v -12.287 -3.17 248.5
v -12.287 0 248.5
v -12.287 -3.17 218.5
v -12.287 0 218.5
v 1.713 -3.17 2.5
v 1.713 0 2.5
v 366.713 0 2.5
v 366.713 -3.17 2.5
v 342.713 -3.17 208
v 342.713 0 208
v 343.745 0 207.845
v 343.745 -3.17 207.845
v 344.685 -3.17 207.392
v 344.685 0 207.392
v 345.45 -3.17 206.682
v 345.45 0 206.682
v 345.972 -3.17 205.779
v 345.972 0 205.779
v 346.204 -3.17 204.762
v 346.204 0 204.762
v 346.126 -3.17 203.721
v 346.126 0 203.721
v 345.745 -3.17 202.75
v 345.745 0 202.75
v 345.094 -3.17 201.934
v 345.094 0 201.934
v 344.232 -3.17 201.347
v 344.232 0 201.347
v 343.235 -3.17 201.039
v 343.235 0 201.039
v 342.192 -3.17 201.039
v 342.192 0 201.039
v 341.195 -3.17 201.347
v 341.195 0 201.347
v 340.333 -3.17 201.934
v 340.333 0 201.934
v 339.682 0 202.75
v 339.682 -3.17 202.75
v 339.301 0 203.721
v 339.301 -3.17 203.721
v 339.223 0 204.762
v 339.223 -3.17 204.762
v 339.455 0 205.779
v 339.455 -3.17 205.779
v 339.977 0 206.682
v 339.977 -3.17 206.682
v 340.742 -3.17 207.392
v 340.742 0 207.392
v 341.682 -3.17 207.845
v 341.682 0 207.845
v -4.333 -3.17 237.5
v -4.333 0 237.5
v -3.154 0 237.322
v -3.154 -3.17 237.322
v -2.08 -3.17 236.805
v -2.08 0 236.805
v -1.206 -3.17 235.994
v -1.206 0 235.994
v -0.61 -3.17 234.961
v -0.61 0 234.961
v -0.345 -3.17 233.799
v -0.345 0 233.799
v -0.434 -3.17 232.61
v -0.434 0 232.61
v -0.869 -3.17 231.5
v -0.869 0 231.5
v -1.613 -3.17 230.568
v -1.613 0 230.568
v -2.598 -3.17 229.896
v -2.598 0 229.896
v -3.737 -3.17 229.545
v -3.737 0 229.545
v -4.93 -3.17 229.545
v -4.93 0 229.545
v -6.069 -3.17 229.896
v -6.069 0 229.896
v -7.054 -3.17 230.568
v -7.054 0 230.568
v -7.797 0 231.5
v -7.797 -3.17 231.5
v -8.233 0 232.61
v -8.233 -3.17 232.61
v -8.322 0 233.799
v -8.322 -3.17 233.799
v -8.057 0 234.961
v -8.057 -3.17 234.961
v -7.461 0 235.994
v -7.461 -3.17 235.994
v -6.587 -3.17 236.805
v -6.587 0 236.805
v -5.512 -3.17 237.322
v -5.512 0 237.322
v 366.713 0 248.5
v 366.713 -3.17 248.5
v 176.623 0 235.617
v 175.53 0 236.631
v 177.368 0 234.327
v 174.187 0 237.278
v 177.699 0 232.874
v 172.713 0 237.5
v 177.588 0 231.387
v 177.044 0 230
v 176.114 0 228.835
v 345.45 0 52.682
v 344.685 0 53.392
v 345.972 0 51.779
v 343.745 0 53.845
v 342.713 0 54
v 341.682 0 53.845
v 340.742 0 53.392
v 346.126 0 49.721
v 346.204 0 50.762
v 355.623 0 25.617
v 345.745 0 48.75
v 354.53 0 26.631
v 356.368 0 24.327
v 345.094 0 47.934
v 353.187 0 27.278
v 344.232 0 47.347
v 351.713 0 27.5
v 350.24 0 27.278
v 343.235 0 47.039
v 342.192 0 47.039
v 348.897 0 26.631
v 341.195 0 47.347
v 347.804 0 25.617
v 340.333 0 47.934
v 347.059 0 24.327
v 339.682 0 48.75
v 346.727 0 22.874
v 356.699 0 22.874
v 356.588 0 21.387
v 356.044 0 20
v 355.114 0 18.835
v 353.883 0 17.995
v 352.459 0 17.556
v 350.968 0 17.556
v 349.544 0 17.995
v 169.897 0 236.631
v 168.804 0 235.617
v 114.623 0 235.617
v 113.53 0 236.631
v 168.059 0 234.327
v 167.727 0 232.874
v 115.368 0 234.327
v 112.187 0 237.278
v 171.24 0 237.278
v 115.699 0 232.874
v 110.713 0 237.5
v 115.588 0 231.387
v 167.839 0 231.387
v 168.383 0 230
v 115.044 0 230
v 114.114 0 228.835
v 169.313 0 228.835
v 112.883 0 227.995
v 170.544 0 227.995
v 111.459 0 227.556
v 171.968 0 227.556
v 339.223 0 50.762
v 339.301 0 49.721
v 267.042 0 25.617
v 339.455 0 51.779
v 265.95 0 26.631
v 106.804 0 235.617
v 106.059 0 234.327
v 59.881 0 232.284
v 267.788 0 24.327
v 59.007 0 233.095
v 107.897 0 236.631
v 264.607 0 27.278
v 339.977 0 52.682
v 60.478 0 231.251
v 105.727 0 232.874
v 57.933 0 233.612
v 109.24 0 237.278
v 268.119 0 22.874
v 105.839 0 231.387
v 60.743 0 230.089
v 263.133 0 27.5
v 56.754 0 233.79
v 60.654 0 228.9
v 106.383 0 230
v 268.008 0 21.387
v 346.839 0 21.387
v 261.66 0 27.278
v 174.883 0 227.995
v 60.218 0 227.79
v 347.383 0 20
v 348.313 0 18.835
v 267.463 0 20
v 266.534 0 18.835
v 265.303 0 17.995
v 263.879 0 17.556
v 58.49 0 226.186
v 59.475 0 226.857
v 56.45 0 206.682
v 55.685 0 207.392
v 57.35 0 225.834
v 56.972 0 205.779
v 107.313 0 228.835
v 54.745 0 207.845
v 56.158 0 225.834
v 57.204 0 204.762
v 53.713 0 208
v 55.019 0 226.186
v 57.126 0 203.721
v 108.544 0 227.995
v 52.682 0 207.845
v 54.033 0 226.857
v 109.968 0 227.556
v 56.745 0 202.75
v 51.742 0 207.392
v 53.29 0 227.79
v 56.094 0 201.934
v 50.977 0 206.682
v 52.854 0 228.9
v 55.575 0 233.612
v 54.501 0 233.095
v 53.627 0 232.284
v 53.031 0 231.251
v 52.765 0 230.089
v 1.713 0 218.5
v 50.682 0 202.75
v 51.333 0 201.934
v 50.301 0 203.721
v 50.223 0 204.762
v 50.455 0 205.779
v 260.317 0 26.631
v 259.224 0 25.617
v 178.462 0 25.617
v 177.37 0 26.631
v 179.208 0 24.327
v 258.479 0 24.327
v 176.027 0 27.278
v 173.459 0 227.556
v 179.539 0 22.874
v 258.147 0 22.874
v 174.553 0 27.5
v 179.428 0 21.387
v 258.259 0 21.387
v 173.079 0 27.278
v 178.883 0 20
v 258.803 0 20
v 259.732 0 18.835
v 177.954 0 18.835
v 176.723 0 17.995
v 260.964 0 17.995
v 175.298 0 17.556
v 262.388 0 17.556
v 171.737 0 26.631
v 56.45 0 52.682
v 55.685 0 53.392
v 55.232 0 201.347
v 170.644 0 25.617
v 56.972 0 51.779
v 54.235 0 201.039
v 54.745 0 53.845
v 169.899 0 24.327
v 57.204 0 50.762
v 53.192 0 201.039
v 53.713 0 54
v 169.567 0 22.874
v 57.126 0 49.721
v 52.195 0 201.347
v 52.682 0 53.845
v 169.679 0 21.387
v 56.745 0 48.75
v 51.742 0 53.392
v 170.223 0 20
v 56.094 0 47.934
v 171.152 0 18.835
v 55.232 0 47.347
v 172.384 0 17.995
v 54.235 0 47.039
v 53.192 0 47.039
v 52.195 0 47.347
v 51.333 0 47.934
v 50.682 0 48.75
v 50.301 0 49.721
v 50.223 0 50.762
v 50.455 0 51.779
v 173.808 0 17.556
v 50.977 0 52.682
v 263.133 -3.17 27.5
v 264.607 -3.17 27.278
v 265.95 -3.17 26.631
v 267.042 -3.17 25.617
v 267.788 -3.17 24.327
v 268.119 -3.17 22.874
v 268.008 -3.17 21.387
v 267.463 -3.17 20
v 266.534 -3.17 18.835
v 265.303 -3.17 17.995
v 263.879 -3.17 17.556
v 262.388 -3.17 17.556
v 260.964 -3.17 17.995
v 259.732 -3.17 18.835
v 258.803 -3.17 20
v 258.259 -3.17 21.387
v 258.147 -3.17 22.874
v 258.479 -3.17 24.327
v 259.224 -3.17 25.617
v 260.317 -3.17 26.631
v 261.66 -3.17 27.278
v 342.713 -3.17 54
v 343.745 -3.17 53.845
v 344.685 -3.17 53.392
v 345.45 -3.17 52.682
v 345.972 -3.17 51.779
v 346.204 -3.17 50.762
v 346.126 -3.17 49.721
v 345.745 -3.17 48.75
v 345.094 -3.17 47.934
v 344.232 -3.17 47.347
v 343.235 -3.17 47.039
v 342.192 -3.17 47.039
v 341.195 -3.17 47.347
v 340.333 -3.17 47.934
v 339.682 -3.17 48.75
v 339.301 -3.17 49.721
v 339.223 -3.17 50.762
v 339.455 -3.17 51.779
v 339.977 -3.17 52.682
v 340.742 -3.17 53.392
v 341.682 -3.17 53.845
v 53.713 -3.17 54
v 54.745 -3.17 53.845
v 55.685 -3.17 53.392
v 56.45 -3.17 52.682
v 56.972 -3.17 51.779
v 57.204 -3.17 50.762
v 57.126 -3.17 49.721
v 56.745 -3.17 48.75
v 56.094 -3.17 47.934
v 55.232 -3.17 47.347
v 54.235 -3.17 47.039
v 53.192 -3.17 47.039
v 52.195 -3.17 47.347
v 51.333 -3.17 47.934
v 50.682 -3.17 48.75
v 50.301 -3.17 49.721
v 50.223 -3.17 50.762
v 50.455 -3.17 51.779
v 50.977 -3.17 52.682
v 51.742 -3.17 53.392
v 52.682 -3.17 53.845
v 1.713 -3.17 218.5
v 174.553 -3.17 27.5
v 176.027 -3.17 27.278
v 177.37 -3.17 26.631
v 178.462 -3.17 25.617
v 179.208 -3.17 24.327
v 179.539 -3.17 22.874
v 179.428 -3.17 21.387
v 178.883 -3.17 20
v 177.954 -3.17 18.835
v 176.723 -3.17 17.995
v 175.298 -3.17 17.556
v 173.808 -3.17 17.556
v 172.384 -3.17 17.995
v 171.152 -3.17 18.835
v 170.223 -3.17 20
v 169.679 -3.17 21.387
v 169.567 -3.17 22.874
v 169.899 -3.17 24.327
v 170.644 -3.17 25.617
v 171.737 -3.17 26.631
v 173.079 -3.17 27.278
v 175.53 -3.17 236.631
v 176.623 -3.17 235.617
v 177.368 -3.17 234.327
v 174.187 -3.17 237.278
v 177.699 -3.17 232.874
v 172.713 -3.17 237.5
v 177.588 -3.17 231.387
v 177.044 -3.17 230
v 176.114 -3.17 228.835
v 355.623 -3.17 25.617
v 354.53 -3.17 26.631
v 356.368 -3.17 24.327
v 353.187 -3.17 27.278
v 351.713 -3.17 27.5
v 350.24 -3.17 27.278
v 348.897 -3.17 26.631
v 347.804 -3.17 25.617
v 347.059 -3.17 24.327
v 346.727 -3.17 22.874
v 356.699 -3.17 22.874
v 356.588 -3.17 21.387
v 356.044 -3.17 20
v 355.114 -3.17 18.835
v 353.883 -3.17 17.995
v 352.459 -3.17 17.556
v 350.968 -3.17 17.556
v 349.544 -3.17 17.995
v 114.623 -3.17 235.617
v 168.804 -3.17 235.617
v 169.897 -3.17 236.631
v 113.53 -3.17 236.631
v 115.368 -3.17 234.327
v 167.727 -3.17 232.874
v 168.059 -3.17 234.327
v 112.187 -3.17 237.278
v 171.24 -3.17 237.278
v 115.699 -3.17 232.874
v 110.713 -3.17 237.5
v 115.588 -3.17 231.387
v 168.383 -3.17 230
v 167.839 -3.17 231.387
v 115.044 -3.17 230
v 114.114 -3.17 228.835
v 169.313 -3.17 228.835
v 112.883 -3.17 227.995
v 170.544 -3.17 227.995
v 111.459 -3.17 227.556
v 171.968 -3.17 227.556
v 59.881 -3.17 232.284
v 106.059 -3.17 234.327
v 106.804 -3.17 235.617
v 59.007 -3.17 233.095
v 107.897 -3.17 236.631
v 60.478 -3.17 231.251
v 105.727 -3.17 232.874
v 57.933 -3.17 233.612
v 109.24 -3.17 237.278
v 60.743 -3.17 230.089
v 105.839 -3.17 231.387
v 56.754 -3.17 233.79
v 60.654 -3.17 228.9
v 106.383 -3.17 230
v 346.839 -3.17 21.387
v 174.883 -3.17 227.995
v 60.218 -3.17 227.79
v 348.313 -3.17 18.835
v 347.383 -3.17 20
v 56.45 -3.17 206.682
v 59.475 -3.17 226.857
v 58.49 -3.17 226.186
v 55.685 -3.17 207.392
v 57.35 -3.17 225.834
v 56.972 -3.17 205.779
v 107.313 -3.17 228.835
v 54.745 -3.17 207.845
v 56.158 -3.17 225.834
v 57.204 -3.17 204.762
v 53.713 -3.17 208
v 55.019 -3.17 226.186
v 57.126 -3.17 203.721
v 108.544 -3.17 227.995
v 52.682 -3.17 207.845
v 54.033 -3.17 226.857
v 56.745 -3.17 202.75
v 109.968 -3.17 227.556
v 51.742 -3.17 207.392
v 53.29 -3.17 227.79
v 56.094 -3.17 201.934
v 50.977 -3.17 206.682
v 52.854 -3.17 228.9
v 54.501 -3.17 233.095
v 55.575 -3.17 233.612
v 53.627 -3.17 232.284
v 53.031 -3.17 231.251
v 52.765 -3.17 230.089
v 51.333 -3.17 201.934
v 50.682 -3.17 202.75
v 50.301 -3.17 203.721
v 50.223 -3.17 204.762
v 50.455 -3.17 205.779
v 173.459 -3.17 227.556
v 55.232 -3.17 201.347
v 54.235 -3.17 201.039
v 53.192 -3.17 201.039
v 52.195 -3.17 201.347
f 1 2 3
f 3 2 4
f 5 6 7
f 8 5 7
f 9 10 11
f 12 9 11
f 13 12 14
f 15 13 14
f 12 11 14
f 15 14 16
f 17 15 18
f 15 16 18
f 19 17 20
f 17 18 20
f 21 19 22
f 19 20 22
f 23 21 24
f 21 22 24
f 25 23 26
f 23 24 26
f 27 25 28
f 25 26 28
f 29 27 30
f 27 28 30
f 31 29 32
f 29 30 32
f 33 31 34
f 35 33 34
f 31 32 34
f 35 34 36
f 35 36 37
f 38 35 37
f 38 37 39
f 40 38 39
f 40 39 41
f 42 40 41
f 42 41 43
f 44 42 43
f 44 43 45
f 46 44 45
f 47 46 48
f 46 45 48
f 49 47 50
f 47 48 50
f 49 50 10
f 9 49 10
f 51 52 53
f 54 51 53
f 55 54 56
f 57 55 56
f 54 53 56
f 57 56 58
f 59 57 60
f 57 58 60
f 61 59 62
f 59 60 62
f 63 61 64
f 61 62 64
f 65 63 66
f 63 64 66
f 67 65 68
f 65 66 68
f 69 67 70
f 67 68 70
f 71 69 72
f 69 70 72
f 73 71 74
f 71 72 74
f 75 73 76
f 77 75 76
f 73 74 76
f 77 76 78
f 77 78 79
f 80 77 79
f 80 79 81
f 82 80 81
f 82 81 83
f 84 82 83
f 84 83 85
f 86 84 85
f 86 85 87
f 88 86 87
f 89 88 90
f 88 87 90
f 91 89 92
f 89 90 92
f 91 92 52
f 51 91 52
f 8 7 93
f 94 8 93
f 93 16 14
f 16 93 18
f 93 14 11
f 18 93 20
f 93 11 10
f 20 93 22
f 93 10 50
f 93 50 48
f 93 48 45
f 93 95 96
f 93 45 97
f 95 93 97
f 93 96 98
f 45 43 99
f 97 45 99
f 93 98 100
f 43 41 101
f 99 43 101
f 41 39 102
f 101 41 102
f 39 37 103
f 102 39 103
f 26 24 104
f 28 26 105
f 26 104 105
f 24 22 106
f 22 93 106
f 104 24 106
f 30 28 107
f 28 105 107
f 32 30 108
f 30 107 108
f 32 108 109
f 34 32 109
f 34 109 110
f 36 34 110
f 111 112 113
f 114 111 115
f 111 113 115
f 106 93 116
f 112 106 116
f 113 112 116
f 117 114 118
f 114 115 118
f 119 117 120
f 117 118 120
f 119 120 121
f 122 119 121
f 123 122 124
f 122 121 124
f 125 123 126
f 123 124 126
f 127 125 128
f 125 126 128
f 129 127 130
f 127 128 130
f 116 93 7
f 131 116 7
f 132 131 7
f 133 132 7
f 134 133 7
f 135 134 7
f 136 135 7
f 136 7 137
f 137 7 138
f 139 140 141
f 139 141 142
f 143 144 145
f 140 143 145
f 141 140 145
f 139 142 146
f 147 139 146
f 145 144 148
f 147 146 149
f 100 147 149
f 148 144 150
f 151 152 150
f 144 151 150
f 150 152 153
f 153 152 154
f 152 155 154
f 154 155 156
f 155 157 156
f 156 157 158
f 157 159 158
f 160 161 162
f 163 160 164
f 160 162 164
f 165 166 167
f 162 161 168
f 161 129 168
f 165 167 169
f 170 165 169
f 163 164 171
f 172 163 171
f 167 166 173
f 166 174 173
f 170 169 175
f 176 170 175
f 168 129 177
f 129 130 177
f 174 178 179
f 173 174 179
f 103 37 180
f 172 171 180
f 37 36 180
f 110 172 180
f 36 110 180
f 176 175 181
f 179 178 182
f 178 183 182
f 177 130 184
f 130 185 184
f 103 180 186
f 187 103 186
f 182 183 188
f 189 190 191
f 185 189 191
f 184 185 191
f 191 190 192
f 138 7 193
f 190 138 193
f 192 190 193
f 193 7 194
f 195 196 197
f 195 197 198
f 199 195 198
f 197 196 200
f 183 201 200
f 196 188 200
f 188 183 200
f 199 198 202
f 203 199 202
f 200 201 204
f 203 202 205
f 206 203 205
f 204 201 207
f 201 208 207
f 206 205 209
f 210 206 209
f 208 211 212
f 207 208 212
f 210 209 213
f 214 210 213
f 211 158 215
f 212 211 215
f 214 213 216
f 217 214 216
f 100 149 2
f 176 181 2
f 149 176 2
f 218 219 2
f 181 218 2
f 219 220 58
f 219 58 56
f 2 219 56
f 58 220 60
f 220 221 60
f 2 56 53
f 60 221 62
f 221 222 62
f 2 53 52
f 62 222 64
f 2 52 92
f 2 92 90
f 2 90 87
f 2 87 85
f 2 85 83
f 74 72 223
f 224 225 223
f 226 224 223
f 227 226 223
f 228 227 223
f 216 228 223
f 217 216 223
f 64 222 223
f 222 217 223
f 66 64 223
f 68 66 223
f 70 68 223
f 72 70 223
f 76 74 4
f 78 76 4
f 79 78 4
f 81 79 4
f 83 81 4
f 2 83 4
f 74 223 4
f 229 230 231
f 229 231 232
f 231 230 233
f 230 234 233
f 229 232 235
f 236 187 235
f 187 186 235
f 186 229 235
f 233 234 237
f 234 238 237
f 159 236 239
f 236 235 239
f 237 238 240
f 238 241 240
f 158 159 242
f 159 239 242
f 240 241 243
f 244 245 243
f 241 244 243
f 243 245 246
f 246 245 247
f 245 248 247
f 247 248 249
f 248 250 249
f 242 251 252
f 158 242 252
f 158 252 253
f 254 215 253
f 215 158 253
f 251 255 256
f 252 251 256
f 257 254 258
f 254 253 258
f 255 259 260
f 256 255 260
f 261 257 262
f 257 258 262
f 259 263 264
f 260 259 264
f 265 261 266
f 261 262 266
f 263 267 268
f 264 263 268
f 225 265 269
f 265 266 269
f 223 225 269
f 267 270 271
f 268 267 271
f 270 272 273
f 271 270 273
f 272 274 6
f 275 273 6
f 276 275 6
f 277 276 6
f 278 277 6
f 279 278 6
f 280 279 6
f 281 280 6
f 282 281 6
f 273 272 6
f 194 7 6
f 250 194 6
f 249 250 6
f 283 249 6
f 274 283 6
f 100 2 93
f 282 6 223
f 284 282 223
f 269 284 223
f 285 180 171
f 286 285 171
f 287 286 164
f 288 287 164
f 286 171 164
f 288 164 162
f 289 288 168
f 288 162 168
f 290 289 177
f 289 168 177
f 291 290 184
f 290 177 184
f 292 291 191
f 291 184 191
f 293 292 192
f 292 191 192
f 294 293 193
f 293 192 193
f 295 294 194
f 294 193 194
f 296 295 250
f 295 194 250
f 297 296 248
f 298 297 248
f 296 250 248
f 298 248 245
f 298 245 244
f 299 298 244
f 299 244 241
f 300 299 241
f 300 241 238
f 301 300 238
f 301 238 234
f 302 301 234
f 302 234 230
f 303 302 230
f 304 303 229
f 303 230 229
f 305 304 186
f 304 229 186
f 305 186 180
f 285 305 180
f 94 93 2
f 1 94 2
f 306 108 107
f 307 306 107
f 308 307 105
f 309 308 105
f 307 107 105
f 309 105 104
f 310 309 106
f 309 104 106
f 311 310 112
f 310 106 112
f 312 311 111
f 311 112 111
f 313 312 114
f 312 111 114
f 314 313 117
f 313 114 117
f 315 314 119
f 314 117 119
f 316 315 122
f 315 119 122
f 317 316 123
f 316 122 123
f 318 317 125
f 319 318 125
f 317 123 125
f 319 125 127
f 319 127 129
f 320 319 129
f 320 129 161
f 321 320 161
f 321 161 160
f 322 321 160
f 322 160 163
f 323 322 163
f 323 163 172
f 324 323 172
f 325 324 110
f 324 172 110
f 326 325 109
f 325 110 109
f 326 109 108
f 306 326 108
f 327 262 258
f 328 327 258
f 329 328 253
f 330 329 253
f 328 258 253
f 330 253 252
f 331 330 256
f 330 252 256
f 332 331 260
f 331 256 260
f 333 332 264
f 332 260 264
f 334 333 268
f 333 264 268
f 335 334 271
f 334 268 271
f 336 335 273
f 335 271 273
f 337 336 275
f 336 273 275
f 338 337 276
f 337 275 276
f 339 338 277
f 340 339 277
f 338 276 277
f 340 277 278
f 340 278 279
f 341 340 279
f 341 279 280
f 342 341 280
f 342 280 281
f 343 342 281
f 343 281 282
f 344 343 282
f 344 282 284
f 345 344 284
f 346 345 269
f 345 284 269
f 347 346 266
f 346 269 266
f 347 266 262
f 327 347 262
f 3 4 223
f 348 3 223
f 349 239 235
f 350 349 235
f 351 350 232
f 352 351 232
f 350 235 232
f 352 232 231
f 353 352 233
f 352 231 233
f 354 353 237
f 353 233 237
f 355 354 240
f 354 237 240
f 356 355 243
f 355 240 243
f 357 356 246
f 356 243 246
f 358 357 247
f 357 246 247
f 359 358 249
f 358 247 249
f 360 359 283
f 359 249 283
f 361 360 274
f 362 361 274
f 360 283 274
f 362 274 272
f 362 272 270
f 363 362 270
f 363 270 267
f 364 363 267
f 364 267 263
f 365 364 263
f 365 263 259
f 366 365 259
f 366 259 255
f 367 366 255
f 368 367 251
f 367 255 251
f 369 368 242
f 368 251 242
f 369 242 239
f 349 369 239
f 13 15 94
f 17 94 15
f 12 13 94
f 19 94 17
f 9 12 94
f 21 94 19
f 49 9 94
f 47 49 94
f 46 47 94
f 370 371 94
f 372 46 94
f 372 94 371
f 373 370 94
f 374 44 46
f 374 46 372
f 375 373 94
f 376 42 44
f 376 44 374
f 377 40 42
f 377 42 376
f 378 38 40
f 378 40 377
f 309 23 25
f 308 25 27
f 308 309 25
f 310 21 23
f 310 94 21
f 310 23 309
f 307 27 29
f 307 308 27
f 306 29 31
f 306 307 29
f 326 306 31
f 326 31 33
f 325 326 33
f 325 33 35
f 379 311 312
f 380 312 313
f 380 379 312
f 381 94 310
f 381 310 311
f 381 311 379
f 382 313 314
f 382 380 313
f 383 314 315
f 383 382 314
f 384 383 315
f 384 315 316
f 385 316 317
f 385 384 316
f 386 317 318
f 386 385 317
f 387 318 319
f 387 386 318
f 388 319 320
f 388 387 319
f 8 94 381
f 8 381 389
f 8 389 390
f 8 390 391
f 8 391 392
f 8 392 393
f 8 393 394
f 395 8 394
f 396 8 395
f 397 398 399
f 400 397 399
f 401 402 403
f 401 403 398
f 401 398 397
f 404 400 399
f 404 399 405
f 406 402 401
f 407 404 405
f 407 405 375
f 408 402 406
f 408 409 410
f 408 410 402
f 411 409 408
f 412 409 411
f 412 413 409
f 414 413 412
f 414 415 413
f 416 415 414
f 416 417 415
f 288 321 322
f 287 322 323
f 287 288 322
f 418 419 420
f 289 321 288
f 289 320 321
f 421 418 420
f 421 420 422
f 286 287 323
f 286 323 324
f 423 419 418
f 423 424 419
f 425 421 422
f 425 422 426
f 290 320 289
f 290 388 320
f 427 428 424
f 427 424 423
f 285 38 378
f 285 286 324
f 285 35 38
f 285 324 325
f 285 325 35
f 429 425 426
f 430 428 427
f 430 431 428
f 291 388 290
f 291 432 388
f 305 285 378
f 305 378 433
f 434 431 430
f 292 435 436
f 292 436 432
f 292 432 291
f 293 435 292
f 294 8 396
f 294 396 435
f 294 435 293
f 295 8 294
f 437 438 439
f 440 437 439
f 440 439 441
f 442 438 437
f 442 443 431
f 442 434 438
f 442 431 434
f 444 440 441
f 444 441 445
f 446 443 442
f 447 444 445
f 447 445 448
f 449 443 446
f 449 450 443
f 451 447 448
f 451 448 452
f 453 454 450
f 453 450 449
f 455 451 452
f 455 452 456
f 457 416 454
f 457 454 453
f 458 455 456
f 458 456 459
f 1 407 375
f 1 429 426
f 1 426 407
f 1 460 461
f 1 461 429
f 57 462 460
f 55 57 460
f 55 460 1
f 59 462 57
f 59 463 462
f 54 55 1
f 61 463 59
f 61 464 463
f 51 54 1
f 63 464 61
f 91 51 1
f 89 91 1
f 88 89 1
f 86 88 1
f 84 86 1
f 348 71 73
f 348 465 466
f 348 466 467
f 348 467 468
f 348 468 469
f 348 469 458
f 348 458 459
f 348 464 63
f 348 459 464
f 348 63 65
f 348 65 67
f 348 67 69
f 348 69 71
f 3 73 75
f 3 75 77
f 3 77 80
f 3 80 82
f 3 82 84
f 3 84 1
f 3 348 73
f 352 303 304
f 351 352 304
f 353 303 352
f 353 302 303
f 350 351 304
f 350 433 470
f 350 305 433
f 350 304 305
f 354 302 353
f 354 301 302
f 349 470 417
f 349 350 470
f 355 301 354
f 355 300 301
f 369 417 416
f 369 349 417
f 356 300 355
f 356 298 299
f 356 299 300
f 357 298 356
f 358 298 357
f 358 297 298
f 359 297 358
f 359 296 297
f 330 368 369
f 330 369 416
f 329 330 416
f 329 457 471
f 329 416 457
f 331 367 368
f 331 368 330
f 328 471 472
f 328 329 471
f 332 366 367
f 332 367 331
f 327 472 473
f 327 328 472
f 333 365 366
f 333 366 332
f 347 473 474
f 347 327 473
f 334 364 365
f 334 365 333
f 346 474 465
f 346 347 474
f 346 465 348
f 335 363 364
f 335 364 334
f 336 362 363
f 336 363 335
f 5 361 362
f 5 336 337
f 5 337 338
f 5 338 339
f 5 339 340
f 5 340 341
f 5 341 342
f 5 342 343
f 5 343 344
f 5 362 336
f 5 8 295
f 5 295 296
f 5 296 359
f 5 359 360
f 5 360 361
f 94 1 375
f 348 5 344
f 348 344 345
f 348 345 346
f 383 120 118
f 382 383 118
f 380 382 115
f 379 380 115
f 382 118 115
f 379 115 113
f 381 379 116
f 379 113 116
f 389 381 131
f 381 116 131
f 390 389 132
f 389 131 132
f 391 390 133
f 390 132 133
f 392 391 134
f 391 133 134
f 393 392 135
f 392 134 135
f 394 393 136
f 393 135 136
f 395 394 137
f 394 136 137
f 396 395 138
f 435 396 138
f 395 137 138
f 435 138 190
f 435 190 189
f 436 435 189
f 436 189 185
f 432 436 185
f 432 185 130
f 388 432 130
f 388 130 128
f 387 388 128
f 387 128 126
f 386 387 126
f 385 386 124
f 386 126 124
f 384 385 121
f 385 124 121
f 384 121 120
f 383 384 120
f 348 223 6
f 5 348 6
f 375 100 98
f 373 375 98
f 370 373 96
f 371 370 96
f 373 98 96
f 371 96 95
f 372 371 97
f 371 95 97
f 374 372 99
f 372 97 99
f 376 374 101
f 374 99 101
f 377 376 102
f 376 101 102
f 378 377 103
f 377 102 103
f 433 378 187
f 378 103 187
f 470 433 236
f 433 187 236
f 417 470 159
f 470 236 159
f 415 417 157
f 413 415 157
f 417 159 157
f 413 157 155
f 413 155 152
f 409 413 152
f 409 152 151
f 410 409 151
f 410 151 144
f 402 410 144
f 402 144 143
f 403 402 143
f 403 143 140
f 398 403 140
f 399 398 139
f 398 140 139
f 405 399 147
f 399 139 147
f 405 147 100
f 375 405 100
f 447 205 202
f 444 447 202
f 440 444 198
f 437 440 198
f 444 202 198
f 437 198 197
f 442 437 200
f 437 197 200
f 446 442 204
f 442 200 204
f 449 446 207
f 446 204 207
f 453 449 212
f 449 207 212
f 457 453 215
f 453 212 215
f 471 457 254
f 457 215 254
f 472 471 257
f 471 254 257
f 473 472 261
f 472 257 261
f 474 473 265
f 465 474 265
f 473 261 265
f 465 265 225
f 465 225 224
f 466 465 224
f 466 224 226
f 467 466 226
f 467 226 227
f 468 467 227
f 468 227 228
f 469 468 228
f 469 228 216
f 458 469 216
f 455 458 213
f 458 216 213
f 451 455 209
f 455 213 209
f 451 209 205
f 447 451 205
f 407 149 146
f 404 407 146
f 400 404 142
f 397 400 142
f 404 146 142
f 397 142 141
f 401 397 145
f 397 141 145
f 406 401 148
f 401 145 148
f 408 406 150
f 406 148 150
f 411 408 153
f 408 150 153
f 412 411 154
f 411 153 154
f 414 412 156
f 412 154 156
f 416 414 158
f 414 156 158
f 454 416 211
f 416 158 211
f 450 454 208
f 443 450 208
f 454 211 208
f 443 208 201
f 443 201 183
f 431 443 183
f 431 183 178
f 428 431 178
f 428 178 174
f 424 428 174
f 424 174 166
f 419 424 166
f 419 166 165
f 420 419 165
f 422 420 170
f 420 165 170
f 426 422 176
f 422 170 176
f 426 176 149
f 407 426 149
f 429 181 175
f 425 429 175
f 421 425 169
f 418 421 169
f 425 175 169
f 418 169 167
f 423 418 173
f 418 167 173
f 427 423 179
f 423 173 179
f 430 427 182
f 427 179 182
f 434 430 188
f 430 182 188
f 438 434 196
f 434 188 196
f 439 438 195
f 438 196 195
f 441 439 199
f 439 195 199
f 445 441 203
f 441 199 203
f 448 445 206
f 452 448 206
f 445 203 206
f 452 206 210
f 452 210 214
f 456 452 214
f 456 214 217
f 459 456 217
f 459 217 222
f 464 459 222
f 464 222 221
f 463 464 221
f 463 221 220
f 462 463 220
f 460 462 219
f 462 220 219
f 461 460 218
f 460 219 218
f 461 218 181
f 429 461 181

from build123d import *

# Parameters (mm, degrees)
SKETCH1_R           = 4
SKETCH1_R_2         = 3.5
SKETCH1_R_3         = 5
BOSS_EXTRUDE1_DEPTH = 3.17


with BuildPart() as part:
    # Sketch1 → Boss-Extrude1 (new body)
    with BuildSketch(Plane(origin=(0, 0, 0), x_dir=(1, 0, 0), z_dir=(0, 1, 0))):
        Polygon((1.713446604, -2.5), (366.713446604, -2.5), (366.713446604, -248.5), (-12.286553396, -248.5), (-12.286553396, -218.5), (1.713446604, -218.5), align=None)
        with Locations(Location((-4.333354101, -233.5, 0), (0, 0, 270))):
            Circle(SKETCH1_R, mode=Mode.SUBTRACT)
        with Locations(Location((56.754069102, -229.789646053, 0), (0, 0, 270))):
            Circle(SKETCH1_R, mode=Mode.SUBTRACT)
        with Locations(Location((53.713446604, -50.5, 0), (0, 0, 270))):
            Circle(SKETCH1_R_2, mode=Mode.SUBTRACT)
        with Locations(Location((53.713446604, -204.5, 0), (0, 0, 270))):
            Circle(SKETCH1_R_2, mode=Mode.SUBTRACT)
        with Locations(Location((342.713446604, -204.5, 0), (0, 0, 270))):
            Circle(SKETCH1_R_2, mode=Mode.SUBTRACT)
        with Locations(Location((342.713446604, -50.5, 0), (0, 0, 270))):
            Circle(SKETCH1_R_2, mode=Mode.SUBTRACT)
        with Locations(Location((263.133334245, -22.5, 0), (0, 0, 270))):
            Circle(SKETCH1_R_3, mode=Mode.SUBTRACT)
        with Locations(Location((172.713446604, -232.5, 0), (0, 0, 270))):
            Circle(SKETCH1_R_3, mode=Mode.SUBTRACT)
        with Locations(Location((110.713446604, -232.5, 0), (0, 0, 270))):
            Circle(SKETCH1_R_3, mode=Mode.SUBTRACT)
        with Locations(Location((174.553221886, -22.5, 0), (0, 0, 270))):
            Circle(SKETCH1_R_3, mode=Mode.SUBTRACT)
        with Locations(Location((351.713446604, -22.5, 0), (0, 0, 270))):
            Circle(SKETCH1_R_3, mode=Mode.SUBTRACT)
    extrude(amount=-BOSS_EXTRUDE1_DEPTH)


solid = part.part
